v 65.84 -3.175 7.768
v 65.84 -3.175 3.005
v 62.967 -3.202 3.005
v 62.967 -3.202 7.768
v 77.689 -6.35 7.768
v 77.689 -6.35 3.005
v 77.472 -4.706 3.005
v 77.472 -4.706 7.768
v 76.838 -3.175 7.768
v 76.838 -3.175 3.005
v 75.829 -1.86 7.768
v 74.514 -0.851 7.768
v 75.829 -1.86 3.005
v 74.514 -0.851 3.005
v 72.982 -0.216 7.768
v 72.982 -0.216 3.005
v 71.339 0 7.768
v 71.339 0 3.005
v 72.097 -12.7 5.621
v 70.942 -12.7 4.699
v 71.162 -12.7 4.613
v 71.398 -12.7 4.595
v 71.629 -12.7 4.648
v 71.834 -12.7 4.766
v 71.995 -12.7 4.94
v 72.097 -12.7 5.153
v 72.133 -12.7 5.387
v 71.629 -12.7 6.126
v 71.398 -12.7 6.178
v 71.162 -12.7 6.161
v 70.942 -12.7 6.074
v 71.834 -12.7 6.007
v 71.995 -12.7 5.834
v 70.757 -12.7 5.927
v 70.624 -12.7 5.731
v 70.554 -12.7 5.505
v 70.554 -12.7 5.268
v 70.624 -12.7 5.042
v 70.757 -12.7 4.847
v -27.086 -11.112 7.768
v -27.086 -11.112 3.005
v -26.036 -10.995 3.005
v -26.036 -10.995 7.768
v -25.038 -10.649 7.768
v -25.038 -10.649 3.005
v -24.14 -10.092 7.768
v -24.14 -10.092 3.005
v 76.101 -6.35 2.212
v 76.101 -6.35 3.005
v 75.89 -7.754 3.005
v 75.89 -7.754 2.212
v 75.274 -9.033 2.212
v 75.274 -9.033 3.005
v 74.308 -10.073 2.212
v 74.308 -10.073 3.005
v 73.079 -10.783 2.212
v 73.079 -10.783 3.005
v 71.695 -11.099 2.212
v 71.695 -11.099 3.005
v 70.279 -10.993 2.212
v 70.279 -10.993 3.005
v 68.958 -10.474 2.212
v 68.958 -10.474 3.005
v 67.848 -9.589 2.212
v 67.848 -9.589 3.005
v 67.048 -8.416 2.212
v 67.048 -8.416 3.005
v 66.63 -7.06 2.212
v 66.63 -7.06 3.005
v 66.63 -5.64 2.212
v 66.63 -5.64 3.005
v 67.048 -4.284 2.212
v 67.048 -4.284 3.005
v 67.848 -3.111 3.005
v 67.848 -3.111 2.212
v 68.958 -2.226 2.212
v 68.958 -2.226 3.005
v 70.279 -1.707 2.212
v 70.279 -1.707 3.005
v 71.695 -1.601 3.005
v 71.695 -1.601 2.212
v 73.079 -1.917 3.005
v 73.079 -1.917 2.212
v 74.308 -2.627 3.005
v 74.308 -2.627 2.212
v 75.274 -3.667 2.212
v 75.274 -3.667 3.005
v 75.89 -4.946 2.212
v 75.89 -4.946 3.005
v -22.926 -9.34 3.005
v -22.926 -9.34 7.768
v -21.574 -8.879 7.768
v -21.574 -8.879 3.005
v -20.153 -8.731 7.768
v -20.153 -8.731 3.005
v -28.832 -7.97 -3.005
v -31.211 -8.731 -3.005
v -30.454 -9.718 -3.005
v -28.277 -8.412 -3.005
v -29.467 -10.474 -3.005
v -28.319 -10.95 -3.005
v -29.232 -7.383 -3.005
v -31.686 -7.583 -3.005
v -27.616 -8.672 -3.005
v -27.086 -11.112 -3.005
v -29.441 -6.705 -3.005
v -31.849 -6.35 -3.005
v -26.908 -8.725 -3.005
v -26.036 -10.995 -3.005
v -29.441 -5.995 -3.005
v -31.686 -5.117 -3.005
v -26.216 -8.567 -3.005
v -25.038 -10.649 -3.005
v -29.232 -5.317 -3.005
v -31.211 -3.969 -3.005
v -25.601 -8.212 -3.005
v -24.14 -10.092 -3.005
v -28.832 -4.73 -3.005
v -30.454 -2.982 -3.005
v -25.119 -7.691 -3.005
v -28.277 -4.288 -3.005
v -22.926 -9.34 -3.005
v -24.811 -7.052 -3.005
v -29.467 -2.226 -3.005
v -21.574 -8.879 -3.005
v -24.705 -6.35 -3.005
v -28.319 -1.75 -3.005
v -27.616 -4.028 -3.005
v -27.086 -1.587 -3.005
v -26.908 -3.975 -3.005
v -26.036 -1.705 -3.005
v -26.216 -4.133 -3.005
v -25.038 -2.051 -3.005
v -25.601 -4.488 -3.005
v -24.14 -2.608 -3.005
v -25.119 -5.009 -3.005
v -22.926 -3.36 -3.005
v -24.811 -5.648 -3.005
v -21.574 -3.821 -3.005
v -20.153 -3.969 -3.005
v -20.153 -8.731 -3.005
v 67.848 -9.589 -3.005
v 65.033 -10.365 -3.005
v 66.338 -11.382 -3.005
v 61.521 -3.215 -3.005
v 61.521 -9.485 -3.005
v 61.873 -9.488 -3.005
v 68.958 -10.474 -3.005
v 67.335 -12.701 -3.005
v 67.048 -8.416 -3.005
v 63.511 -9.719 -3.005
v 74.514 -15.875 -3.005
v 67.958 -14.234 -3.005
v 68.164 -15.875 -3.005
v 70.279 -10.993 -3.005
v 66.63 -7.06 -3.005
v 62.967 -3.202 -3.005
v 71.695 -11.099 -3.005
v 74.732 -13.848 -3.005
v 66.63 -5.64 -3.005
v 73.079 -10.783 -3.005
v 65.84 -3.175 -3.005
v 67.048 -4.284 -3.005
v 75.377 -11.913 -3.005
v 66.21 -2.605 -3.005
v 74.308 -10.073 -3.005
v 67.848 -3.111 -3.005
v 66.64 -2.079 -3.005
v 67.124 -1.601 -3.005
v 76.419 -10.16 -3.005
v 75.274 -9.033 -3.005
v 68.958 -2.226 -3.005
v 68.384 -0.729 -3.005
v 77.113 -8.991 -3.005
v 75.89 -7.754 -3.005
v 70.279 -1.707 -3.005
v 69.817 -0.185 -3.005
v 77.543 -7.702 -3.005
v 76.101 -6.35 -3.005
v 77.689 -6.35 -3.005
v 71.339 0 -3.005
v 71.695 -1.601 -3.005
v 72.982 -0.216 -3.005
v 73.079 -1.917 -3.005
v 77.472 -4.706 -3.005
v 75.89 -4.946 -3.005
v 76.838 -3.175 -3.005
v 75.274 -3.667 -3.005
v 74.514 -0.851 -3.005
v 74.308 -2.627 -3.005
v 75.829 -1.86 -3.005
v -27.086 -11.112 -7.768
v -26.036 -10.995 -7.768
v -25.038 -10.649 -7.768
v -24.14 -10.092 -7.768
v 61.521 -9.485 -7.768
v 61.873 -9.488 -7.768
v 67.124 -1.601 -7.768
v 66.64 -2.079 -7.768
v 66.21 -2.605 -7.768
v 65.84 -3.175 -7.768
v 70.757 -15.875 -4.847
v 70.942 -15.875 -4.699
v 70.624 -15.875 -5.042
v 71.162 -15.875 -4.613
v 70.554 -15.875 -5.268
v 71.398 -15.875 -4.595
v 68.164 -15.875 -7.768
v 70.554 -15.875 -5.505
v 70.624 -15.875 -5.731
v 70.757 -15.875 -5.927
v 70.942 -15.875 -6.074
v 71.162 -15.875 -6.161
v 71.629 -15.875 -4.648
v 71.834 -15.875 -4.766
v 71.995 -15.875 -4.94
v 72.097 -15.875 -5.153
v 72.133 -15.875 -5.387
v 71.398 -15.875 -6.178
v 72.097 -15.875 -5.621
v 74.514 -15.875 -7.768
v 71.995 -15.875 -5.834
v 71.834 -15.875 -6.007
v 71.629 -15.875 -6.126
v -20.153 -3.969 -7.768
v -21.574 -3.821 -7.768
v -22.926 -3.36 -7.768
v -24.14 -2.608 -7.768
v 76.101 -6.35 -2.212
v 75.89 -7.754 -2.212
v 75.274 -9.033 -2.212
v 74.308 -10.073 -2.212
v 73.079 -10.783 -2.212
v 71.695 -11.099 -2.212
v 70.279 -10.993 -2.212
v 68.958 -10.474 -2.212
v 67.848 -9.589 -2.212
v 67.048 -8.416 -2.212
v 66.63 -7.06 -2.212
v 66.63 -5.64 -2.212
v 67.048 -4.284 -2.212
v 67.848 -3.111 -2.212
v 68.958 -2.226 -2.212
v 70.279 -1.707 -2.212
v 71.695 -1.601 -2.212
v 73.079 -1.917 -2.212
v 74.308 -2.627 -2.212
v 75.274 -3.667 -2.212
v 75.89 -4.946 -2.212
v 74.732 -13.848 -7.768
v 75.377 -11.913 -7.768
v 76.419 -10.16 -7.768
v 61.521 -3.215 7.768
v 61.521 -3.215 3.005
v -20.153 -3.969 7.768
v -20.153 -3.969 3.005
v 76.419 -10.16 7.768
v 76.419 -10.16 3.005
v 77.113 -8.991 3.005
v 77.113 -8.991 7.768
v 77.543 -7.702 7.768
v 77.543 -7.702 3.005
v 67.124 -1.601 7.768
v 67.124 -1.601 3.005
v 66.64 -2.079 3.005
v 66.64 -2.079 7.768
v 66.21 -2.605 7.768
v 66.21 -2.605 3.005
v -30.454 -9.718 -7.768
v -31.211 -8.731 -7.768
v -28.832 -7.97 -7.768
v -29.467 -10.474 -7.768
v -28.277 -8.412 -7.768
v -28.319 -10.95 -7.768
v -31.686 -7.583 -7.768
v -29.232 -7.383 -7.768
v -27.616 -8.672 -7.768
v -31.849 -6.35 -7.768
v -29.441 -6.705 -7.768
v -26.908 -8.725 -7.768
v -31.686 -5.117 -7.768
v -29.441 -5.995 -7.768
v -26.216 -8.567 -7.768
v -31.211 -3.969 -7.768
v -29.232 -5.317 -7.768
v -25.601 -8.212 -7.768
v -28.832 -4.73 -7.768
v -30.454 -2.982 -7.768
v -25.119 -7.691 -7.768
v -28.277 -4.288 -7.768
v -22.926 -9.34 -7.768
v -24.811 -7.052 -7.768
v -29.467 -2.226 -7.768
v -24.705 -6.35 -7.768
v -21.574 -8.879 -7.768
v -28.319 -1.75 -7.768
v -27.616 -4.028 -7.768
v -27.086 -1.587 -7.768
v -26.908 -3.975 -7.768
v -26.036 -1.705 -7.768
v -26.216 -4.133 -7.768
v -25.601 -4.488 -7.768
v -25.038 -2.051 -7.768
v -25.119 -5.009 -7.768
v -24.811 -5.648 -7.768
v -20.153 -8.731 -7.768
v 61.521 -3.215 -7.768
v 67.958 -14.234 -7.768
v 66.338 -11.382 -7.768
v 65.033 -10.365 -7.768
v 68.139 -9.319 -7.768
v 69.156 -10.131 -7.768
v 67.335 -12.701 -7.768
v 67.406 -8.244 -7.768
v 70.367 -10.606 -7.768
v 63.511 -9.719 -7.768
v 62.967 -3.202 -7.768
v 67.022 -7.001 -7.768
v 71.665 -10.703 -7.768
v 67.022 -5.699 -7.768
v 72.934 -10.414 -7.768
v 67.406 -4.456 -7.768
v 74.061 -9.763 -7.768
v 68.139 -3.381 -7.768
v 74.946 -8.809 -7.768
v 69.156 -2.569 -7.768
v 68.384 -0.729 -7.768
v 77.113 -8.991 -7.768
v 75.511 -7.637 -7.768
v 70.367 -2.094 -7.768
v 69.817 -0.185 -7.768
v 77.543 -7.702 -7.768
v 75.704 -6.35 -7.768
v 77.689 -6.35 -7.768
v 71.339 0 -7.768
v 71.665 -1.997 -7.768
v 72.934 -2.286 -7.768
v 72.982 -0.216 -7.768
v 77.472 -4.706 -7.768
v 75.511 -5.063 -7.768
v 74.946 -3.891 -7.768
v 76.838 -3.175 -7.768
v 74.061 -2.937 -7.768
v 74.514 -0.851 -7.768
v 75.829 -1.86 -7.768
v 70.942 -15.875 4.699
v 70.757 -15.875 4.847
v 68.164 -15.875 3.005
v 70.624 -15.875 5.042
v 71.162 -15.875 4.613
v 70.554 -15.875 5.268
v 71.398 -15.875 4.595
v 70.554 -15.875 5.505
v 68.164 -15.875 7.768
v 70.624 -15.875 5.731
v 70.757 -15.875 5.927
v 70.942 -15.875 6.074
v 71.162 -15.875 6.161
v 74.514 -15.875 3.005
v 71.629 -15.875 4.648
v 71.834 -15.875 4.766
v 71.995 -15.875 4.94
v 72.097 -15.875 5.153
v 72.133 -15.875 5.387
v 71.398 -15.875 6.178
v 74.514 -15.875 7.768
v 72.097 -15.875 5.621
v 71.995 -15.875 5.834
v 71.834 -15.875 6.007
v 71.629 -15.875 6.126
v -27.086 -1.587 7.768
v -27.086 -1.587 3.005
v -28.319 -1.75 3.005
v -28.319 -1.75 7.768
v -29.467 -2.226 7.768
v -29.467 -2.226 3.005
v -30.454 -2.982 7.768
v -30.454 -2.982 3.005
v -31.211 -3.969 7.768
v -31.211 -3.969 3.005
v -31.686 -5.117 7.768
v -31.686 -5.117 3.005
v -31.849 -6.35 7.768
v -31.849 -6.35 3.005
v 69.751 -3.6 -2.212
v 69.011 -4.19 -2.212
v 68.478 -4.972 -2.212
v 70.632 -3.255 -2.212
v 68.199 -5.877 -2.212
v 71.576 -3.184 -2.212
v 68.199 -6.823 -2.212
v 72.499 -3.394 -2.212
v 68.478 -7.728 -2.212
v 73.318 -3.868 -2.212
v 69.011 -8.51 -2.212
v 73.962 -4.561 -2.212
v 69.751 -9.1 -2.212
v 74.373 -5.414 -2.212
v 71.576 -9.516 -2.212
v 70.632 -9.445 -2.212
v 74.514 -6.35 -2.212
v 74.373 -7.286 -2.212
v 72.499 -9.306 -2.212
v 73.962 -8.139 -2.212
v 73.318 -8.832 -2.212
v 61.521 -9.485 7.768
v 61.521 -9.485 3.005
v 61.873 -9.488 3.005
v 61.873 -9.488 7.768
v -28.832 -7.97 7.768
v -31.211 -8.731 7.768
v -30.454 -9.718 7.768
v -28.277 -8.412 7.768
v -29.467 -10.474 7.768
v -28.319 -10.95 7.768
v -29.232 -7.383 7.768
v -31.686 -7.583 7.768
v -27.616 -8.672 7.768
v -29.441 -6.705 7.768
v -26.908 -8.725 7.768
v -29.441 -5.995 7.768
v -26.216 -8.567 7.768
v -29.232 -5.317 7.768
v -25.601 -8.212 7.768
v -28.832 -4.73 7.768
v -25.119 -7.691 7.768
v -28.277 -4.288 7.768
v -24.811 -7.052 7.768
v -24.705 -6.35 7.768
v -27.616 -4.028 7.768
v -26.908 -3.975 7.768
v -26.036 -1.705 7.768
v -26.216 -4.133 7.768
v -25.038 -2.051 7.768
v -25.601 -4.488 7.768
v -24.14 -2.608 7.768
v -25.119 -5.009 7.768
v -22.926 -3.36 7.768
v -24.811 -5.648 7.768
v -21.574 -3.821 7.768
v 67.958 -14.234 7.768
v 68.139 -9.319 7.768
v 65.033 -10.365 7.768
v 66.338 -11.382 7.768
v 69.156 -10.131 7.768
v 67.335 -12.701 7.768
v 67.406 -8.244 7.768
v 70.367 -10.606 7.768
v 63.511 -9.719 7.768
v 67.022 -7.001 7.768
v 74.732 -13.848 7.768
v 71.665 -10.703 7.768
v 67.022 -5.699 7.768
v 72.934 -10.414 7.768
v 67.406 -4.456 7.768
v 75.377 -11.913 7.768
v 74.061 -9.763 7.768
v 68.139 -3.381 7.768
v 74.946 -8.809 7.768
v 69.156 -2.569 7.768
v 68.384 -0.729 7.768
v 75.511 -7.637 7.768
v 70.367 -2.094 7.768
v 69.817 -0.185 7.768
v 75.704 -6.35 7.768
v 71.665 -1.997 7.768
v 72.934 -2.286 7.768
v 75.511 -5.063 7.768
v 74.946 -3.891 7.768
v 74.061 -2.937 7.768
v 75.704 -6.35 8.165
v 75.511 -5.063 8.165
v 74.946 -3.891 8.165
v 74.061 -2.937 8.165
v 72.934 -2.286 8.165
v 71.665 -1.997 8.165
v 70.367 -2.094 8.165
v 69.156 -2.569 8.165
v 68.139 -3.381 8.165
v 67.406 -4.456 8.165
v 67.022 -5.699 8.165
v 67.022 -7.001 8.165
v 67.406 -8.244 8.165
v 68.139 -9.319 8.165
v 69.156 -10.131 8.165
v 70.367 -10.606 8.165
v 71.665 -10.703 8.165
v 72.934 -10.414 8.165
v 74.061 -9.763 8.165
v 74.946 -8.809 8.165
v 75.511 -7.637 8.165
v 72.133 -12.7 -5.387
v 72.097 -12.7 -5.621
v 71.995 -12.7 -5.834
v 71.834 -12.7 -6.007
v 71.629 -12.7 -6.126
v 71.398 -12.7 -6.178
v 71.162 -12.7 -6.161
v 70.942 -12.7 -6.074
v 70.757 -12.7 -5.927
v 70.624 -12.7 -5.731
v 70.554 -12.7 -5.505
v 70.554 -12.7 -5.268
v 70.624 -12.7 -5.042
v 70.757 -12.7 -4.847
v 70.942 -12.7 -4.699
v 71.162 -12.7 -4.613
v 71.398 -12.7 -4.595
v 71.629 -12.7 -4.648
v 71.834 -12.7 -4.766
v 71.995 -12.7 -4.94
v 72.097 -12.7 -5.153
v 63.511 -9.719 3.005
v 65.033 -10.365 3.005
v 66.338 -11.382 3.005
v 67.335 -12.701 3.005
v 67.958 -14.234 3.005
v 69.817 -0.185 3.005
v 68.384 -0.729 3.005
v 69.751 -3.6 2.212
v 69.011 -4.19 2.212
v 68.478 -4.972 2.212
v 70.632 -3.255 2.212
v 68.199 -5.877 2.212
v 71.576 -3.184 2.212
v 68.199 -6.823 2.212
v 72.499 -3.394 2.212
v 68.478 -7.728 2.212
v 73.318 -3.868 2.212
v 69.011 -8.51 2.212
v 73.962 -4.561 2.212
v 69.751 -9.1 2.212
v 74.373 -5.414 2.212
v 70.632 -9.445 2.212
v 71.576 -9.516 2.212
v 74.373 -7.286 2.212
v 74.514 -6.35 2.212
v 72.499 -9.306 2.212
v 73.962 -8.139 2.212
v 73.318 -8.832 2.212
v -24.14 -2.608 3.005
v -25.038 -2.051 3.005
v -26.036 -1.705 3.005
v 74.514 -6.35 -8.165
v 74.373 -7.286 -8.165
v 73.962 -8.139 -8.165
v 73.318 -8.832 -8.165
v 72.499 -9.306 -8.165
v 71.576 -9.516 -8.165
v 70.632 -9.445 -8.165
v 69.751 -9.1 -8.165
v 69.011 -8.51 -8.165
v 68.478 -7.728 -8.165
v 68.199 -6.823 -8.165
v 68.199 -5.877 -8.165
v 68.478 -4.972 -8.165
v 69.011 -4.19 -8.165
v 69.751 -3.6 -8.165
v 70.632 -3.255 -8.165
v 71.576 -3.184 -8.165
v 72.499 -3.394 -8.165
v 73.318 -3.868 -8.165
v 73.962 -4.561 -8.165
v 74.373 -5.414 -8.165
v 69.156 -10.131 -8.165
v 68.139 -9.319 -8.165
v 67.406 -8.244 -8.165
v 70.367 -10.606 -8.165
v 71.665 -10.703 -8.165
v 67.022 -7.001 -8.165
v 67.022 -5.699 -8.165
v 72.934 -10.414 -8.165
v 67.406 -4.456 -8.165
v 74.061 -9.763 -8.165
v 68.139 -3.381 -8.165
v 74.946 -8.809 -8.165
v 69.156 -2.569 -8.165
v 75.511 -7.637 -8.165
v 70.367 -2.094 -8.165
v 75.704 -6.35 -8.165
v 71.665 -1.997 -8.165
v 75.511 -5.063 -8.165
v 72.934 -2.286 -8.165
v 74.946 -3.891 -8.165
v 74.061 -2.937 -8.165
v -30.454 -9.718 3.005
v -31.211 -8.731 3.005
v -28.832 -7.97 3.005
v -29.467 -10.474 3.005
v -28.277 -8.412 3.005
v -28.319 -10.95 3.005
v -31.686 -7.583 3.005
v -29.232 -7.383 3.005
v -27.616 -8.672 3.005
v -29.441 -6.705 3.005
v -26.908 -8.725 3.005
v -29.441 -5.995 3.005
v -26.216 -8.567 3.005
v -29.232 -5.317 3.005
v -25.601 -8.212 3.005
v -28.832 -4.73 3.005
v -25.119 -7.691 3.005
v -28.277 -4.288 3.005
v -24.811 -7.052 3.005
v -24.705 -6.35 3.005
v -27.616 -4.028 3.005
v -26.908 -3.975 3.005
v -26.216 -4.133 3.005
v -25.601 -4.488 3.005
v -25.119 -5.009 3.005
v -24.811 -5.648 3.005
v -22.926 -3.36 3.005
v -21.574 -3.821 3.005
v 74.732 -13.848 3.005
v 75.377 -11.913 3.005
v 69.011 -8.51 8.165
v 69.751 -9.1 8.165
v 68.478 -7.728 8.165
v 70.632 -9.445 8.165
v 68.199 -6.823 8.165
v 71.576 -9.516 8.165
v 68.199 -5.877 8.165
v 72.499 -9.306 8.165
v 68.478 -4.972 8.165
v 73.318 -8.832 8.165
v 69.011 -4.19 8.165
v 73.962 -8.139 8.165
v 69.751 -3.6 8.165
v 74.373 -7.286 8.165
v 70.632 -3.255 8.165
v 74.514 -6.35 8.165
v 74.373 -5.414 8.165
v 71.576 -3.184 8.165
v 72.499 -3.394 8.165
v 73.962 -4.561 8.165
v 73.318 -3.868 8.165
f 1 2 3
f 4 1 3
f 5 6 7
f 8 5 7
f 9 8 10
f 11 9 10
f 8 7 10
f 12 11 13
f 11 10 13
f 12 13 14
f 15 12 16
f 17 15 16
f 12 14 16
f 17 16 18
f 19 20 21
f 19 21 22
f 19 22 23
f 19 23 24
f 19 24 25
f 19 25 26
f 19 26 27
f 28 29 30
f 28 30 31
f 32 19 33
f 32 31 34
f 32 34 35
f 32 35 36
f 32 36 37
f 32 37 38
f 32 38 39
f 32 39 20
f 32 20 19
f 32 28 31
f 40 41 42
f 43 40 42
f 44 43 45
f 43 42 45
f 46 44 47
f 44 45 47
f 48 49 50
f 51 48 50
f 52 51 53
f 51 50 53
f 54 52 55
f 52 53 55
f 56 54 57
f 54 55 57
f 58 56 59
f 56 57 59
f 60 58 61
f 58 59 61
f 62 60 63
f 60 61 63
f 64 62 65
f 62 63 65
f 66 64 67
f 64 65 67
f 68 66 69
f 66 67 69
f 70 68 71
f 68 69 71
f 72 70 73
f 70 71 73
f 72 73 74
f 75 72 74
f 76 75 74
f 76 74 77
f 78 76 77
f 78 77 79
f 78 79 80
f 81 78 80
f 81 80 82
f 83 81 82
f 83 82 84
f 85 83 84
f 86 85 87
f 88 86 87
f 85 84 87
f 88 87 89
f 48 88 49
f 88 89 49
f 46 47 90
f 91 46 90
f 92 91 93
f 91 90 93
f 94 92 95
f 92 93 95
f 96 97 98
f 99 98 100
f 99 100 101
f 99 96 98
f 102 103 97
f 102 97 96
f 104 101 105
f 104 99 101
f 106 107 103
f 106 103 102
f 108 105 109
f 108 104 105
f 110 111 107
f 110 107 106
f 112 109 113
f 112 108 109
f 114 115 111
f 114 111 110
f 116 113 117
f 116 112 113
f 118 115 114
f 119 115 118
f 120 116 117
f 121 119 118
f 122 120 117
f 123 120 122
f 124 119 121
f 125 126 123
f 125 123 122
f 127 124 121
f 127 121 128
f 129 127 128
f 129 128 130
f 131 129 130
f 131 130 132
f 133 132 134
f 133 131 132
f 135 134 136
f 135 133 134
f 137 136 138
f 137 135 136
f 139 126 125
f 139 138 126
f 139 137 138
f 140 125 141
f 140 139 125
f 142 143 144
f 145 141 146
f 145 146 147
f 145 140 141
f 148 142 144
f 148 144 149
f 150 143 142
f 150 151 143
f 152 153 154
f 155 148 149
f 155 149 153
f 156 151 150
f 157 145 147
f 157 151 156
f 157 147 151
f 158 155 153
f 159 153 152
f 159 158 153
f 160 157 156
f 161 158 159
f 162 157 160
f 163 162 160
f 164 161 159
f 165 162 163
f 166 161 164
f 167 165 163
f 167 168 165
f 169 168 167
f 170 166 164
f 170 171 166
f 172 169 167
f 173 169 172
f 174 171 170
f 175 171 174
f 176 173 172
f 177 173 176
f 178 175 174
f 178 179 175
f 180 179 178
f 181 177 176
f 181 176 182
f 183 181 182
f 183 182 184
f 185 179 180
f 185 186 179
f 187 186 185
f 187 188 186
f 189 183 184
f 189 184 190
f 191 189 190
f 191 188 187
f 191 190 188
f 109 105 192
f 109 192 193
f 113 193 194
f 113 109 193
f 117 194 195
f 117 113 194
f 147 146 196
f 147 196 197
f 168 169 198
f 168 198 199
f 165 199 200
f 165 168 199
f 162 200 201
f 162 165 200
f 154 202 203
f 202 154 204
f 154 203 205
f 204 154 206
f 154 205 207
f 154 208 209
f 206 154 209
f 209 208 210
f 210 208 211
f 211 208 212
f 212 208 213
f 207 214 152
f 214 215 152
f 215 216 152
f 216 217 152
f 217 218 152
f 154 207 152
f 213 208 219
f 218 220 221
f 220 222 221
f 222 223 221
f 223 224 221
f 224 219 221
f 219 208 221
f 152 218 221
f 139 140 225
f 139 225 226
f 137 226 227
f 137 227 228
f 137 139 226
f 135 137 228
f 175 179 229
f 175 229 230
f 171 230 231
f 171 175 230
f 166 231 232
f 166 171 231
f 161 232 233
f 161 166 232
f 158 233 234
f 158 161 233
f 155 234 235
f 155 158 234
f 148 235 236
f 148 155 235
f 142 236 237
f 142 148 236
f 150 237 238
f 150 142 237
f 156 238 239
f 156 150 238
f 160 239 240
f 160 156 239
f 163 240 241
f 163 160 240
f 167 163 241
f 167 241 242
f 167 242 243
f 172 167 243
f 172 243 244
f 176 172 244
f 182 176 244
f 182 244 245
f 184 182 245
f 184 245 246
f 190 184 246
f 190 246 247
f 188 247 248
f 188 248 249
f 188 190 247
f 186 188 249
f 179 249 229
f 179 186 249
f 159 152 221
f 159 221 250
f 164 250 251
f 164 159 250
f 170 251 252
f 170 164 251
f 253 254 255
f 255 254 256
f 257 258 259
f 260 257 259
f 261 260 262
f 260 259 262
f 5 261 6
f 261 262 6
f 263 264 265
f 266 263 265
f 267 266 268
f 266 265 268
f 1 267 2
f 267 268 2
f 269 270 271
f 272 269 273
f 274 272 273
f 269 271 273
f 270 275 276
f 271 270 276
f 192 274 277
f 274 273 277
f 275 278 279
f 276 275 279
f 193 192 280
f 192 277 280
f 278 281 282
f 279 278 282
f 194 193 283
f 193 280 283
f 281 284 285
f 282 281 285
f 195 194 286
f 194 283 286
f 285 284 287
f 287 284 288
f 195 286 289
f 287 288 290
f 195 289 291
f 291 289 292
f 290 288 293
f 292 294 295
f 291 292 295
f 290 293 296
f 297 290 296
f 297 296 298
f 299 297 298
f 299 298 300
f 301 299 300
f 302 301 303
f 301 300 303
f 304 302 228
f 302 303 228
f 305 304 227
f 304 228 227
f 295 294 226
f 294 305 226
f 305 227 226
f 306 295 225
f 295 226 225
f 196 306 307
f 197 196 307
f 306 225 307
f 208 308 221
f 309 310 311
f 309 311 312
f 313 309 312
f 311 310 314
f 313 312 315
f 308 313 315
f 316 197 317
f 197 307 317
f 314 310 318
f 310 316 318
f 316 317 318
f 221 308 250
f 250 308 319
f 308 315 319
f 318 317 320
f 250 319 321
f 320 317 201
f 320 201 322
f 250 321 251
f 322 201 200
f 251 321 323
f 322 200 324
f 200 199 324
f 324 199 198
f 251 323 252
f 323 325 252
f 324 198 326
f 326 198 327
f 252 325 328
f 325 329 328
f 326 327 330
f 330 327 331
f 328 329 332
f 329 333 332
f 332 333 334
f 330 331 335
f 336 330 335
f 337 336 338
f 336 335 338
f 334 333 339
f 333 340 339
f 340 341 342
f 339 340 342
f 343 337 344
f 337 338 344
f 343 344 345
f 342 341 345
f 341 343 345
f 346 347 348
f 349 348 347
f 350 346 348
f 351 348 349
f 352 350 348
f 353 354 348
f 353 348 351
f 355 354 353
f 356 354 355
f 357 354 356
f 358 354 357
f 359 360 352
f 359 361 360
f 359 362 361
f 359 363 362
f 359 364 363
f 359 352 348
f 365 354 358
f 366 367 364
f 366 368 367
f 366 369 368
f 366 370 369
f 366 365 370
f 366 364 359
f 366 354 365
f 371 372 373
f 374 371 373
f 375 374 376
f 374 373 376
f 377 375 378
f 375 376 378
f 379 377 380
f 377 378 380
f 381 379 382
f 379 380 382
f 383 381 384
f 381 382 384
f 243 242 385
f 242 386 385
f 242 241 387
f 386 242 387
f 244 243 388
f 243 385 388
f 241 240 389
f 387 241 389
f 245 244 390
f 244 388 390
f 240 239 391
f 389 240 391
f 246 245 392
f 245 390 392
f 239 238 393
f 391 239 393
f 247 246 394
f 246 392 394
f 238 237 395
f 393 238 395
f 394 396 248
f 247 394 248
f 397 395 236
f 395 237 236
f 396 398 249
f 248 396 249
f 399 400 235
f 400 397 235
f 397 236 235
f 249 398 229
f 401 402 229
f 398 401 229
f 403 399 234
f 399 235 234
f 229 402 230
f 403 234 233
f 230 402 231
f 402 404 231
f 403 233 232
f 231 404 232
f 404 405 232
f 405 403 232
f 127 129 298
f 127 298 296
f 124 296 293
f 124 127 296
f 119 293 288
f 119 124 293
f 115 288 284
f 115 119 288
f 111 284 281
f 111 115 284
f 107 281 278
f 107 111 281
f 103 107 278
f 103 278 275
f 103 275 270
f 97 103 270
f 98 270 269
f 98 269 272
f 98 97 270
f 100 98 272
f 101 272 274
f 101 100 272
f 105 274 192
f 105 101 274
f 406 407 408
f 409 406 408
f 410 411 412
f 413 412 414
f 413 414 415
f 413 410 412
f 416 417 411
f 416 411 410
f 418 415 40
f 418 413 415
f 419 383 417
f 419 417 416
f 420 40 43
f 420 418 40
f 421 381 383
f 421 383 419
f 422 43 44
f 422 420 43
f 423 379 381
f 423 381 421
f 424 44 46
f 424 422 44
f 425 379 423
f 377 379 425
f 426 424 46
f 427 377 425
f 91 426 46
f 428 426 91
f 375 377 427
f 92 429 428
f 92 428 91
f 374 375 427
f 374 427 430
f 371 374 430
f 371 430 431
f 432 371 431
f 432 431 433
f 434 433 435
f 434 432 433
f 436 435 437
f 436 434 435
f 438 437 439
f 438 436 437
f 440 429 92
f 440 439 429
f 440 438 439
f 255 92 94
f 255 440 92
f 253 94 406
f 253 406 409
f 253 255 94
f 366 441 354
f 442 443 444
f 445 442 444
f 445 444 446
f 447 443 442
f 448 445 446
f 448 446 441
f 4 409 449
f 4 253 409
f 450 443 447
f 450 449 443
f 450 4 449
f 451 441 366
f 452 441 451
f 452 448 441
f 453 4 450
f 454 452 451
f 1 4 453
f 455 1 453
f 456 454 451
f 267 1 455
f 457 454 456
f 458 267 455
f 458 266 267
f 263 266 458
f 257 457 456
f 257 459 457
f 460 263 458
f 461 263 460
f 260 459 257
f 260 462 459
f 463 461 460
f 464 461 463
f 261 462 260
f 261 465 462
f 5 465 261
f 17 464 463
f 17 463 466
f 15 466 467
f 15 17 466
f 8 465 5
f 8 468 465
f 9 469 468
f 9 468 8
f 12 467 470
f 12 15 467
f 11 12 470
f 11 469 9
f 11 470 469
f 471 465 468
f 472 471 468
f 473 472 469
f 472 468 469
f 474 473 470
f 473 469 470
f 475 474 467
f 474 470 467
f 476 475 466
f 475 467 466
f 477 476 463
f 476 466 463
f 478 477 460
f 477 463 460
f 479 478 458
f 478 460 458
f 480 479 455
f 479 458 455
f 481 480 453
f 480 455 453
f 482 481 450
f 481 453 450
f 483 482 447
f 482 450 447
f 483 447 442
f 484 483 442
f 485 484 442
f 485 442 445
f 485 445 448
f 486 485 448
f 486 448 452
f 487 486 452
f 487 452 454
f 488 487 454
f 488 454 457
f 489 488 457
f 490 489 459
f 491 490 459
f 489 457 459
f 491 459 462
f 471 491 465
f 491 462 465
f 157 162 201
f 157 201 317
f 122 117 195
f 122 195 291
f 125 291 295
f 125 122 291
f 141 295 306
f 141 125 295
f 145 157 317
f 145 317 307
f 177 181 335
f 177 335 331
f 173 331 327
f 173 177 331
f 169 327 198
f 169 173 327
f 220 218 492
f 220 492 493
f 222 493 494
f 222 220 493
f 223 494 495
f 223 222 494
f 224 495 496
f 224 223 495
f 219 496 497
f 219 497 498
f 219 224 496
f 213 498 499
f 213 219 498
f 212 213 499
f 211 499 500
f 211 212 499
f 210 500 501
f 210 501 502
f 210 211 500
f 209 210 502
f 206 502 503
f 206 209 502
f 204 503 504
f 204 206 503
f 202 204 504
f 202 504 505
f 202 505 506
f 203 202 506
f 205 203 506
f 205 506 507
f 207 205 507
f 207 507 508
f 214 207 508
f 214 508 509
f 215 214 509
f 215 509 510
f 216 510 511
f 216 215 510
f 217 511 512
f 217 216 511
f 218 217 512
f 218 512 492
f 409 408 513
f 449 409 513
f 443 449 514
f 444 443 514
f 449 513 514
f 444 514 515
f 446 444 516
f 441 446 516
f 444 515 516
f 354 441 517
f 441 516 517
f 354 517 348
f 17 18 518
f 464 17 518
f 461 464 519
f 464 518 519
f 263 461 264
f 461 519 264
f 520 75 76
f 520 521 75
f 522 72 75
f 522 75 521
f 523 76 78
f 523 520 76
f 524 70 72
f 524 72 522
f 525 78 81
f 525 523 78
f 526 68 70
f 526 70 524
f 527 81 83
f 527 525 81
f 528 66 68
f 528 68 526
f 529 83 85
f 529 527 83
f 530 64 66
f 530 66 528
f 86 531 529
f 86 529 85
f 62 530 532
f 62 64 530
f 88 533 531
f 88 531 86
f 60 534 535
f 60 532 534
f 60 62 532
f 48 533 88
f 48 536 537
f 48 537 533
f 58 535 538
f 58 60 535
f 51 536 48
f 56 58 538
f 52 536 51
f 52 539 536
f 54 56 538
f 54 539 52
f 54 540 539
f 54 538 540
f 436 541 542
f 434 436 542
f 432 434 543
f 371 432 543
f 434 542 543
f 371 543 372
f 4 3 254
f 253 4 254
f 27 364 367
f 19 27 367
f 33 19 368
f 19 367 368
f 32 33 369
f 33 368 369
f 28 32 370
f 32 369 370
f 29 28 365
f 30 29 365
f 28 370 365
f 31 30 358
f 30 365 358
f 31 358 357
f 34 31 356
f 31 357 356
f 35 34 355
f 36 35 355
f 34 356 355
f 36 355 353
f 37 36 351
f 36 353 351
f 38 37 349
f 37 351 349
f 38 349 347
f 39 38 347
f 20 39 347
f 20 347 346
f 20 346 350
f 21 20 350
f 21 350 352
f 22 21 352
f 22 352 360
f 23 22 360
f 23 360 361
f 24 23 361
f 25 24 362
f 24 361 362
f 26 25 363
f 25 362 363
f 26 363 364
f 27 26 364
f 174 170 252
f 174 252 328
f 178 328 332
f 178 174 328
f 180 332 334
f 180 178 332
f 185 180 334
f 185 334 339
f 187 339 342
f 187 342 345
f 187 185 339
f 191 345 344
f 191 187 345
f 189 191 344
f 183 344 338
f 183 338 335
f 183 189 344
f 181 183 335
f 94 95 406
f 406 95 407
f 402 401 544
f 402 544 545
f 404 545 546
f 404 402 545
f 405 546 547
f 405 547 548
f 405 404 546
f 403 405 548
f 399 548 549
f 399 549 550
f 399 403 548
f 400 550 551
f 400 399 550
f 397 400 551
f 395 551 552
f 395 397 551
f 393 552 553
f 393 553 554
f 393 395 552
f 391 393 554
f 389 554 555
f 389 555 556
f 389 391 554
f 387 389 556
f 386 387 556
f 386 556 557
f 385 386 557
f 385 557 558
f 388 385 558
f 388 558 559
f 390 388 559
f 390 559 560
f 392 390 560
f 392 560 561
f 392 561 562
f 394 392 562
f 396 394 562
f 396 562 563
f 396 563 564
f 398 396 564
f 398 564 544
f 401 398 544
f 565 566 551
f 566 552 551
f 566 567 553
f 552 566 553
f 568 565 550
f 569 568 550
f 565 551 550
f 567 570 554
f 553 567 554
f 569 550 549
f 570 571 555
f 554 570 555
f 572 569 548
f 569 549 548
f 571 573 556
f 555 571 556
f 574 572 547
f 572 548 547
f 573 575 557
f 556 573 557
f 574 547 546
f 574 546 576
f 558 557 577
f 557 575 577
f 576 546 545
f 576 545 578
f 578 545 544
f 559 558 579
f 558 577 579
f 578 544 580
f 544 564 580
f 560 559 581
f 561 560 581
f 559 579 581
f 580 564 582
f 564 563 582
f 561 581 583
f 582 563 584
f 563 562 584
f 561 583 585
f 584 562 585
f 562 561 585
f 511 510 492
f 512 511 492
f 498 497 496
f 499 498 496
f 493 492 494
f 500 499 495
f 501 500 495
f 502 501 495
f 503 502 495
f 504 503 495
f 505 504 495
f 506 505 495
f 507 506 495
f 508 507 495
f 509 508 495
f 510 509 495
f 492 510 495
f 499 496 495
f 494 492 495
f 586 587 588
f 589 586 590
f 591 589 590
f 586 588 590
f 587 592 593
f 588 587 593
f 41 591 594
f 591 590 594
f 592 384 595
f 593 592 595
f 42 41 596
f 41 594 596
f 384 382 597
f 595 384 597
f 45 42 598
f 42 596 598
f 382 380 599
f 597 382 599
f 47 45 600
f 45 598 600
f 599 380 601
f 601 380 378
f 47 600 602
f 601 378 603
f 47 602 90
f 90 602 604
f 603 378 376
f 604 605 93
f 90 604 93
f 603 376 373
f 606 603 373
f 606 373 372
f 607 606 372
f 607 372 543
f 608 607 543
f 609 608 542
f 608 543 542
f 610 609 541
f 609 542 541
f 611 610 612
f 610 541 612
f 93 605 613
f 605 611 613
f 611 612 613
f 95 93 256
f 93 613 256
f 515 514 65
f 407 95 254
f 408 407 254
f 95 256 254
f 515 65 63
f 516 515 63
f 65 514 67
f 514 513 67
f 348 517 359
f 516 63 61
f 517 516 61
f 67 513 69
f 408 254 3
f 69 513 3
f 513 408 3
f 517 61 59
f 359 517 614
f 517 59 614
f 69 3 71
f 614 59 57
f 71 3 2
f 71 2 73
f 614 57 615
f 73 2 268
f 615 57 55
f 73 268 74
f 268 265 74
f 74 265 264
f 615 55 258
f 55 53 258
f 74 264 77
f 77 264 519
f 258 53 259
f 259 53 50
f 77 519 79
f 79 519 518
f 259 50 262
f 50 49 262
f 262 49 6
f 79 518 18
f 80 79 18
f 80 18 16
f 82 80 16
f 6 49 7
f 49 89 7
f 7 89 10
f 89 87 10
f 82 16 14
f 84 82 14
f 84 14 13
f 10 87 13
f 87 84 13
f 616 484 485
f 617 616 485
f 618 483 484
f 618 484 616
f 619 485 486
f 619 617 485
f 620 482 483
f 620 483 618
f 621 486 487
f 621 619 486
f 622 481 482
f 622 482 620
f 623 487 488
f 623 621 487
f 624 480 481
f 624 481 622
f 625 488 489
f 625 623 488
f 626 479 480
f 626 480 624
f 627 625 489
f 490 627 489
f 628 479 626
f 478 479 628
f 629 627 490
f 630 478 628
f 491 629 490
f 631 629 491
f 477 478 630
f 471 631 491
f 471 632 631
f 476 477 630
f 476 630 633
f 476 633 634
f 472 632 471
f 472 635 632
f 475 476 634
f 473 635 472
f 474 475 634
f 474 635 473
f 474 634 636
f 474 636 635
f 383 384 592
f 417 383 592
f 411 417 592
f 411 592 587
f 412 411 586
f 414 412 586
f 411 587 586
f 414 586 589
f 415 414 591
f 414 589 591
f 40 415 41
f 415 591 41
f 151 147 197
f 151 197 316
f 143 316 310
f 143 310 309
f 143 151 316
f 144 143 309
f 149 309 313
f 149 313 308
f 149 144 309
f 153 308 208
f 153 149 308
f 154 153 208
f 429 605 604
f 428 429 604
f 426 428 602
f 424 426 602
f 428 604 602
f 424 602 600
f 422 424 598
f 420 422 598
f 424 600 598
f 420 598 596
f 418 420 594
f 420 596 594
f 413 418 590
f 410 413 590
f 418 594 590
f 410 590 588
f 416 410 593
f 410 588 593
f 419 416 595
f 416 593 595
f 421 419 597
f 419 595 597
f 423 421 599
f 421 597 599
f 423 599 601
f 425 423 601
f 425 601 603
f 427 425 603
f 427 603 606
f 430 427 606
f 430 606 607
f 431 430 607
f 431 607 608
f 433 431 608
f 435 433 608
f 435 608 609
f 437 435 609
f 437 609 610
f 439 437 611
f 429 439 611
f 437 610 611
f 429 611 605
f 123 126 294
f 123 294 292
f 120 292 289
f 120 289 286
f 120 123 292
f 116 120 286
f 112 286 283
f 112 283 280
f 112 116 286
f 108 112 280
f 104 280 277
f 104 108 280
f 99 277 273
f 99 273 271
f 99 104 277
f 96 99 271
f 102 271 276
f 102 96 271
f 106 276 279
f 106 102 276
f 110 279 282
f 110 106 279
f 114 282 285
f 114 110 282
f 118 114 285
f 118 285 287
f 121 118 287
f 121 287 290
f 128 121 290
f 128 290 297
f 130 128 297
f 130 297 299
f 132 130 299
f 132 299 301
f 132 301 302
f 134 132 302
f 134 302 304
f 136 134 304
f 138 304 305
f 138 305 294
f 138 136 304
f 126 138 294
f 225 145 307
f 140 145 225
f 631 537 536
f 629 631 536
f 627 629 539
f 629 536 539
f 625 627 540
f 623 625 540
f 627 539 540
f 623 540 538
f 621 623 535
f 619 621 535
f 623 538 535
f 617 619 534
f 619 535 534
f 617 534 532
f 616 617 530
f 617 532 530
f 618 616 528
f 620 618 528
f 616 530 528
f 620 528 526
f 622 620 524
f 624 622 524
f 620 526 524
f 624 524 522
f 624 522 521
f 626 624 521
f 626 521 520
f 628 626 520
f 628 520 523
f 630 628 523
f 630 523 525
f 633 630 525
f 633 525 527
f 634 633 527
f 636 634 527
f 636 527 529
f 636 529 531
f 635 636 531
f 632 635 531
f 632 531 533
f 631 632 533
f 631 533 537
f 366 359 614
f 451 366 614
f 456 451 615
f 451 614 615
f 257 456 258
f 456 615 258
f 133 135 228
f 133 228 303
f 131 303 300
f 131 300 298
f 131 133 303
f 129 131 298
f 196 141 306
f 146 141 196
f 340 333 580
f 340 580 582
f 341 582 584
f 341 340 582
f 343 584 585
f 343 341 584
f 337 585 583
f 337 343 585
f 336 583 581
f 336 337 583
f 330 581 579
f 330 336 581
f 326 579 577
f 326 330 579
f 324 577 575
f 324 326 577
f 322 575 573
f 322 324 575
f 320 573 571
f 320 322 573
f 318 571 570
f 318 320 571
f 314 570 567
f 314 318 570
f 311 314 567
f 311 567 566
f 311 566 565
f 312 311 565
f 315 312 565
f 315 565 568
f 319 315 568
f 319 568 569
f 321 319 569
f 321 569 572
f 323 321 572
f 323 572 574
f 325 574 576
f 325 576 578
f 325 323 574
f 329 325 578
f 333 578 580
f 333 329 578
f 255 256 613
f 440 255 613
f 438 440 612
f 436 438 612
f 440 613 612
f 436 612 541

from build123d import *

# Parameters (mm, degrees)
F0_W      = 109.5375
F0_H      = 4.7625
F1_DEPTH  = 15.875
F3_DEPTH  = 4.7625
F4_R      = 2.38125
F5_DEPTH  = 4.7625
F6_R      = 4.7625
F7_DEPTH  = 0.79375
F8_R      = 4.365625
F9_DEPTH  = 0.396875
F10_R     = 3.175
F11_DEPTH = 6.35
F12_R     = 0.79375
F13_DEPTH = 3.175


# Not quite as in the source:
# - a length typed as a fraction of an inch, garbled in the dataset ("3 / 203.2 mm" for 3/8 in), is restored


with BuildPart() as f1:
    # F0 (on Front) → F1 (new body)
    with BuildSketch(Plane.XZ):
        with Locations((22.9201070249, 5.3867108949)):
            Rectangle(F0_W, F0_H)
    extrude(amount=F1_DEPTH)

    # F2 (on face) → F3 (cut)
    with BuildSketch(Plane(origin=(0, 0, 3.0054608949), x_dir=(1, 0, 0), z_dir=(0, 0, -1))):
        with BuildLine():
            ThreePointArc((67.1235889731, 1.6008932155), (66.4182398642, 2.3362702187), (65.8395957109, 3.175))
            Line((65.8395957109, 3.175), (62.9669316793, 3.2015159353))
            ThreePointArc((62.9669316793, 3.2015159353), (65.190207924, 2.7776190059), (67.1235889731, 1.6008932155))
        make_face()
        with BuildLine():
            Line((68.1638570249, 15.875), (-27.0861429751, 15.875))
            Line((-27.0861429751, 15.875), (-27.0861429751, 11.1125))
            ThreePointArc((-27.0861429751, 11.1125), (-25.5271603838, 10.8501088353), (-24.1399628876, 10.091848359))
            ThreePointArc((-24.1399628876, 10.091848359), (-22.262653003, 9.0713052051), (-20.1531120128, 8.73125))
            Line((-20.1531120128, 8.73125), (61.5207105875, 9.4851348166))
            Line((61.5207105875, 9.4851348166), (61.8725749266, 9.4883826771))
            ThreePointArc((61.8725749266, 9.4883826771), (66.3377291769, 11.3818749629), (68.1638570249, 15.875))
        make_face()
        with BuildLine():
            ThreePointArc((-24.1399628876, 2.608151641), (-25.5271603838, 1.8498911647), (-27.0861429751, 1.5875))
            Line((-27.0861429751, 1.5875), (-27.0861429751, 0))
            Line((-27.0861429751, 0), (71.3388570249, 0))
            ThreePointArc((71.3388570249, 0), (69.0843424521, 0.4136994651), (67.1235889731, 1.6008932155))
            ThreePointArc((67.1235889731, 1.6008932155), (65.190207924, 2.7776190059), (62.9669316793, 3.2015159353))
            Line((62.9669316793, 3.2015159353), (61.5207105875, 3.2148651834))
            Line((61.5207105875, 3.2148651834), (-20.1531120128, 3.96875))
            ThreePointArc((-20.1531120128, 3.96875), (-22.262653003, 3.6286947949), (-24.1399628876, 2.608151641))
        make_face()
        with BuildLine():
            Line((-27.0861429751, 11.1125), (-27.0861429751, 15.875))
            Line((-27.0861429751, 15.875), (-31.8486429751, 15.875))
            Line((-31.8486429751, 15.875), (-31.8486429751, 6.35))
            ThreePointArc((-31.8486429751, 6.35), (-30.4537390205, 9.7175960454), (-27.0861429751, 11.1125))
        make_face()
        with BuildLine():
            ThreePointArc((-27.0861429751, 1.5875), (-30.4537390205, 2.9824039546), (-31.8486429751, 6.35))
            Line((-31.8486429751, 6.35), (-31.8486429751, 0))
            Line((-31.8486429751, 0), (-27.0861429751, 0))
            Line((-27.0861429751, 0), (-27.0861429751, 1.5875))
        make_face()
        with BuildLine():
            Line((77.6888570249, 15.875), (74.5138570249, 15.875))
            ThreePointArc((74.5138570249, 15.875), (75.002648611, 12.8629305287), (76.4188570249, 10.16))
            ThreePointArc((76.4188570249, 10.16), (77.3629959675, 8.3580463142), (77.6888570249, 6.35))
            Line((77.6888570249, 6.35), (77.6888570249, 15.875))
        make_face()
        with BuildLine():
            ThreePointArc((77.6888570249, 6.35), (75.8289850854, 1.8598719395), (71.3388570249, 0))
            Line((71.3388570249, 0), (77.6888570249, 0))
            Line((77.6888570249, 0), (77.6888570249, 6.35))
        make_face()
    extrude(amount=-F3_DEPTH, mode=Mode.SUBTRACT)

    # F4 (on face) → F5 (cut)
    with BuildSketch(Plane(origin=(0, 0, 3.0054608949), x_dir=(1, 0, 0), z_dir=(0, 0, -1))):
        with Locations((-27.0861429751, 6.35)):
            Circle(F4_R)
    extrude(amount=-F5_DEPTH, mode=Mode.SUBTRACT)

    # F6 (on face) → F7 (join)
    with BuildSketch(Plane(origin=(0, 0, 3.0054608949), x_dir=(1, 0, 0), z_dir=(0, 0, -1))):
        with Locations((71.3388570249, 6.35)):
            Circle(F6_R)
    extrude(amount=F7_DEPTH)

    # F8 (on face) → F9 (join)
    with BuildSketch(Plane.XY.offset(7.7679608949)):
        with Locations((71.3388570249, -6.35)):
            Circle(F8_R)
    extrude(amount=F9_DEPTH)

    # F10 (on face) → F11 (cut)
    with BuildSketch(Plane(origin=(0, 0, 2.2117108949), x_dir=(1, 0, 0), z_dir=(0, 0, -1))):
        with Locations((71.3388570249, 6.35)):
            Circle(F10_R)
    extrude(amount=-F11_DEPTH, mode=Mode.SUBTRACT)

    # F12 (on face) → F13 (cut)
    with BuildSketch(Plane.XZ.offset(15.875)):
        with Locations((71.3388570249, 5.3867108949)):
            Circle(F12_R)
    extrude(amount=-F13_DEPTH, mode=Mode.SUBTRACT)


with BuildPart() as f15_1:
    # F15: instance of F1
    add(f1.part.mirror(Plane.XY))


solid = Compound([f1.part, f15_1.part])
